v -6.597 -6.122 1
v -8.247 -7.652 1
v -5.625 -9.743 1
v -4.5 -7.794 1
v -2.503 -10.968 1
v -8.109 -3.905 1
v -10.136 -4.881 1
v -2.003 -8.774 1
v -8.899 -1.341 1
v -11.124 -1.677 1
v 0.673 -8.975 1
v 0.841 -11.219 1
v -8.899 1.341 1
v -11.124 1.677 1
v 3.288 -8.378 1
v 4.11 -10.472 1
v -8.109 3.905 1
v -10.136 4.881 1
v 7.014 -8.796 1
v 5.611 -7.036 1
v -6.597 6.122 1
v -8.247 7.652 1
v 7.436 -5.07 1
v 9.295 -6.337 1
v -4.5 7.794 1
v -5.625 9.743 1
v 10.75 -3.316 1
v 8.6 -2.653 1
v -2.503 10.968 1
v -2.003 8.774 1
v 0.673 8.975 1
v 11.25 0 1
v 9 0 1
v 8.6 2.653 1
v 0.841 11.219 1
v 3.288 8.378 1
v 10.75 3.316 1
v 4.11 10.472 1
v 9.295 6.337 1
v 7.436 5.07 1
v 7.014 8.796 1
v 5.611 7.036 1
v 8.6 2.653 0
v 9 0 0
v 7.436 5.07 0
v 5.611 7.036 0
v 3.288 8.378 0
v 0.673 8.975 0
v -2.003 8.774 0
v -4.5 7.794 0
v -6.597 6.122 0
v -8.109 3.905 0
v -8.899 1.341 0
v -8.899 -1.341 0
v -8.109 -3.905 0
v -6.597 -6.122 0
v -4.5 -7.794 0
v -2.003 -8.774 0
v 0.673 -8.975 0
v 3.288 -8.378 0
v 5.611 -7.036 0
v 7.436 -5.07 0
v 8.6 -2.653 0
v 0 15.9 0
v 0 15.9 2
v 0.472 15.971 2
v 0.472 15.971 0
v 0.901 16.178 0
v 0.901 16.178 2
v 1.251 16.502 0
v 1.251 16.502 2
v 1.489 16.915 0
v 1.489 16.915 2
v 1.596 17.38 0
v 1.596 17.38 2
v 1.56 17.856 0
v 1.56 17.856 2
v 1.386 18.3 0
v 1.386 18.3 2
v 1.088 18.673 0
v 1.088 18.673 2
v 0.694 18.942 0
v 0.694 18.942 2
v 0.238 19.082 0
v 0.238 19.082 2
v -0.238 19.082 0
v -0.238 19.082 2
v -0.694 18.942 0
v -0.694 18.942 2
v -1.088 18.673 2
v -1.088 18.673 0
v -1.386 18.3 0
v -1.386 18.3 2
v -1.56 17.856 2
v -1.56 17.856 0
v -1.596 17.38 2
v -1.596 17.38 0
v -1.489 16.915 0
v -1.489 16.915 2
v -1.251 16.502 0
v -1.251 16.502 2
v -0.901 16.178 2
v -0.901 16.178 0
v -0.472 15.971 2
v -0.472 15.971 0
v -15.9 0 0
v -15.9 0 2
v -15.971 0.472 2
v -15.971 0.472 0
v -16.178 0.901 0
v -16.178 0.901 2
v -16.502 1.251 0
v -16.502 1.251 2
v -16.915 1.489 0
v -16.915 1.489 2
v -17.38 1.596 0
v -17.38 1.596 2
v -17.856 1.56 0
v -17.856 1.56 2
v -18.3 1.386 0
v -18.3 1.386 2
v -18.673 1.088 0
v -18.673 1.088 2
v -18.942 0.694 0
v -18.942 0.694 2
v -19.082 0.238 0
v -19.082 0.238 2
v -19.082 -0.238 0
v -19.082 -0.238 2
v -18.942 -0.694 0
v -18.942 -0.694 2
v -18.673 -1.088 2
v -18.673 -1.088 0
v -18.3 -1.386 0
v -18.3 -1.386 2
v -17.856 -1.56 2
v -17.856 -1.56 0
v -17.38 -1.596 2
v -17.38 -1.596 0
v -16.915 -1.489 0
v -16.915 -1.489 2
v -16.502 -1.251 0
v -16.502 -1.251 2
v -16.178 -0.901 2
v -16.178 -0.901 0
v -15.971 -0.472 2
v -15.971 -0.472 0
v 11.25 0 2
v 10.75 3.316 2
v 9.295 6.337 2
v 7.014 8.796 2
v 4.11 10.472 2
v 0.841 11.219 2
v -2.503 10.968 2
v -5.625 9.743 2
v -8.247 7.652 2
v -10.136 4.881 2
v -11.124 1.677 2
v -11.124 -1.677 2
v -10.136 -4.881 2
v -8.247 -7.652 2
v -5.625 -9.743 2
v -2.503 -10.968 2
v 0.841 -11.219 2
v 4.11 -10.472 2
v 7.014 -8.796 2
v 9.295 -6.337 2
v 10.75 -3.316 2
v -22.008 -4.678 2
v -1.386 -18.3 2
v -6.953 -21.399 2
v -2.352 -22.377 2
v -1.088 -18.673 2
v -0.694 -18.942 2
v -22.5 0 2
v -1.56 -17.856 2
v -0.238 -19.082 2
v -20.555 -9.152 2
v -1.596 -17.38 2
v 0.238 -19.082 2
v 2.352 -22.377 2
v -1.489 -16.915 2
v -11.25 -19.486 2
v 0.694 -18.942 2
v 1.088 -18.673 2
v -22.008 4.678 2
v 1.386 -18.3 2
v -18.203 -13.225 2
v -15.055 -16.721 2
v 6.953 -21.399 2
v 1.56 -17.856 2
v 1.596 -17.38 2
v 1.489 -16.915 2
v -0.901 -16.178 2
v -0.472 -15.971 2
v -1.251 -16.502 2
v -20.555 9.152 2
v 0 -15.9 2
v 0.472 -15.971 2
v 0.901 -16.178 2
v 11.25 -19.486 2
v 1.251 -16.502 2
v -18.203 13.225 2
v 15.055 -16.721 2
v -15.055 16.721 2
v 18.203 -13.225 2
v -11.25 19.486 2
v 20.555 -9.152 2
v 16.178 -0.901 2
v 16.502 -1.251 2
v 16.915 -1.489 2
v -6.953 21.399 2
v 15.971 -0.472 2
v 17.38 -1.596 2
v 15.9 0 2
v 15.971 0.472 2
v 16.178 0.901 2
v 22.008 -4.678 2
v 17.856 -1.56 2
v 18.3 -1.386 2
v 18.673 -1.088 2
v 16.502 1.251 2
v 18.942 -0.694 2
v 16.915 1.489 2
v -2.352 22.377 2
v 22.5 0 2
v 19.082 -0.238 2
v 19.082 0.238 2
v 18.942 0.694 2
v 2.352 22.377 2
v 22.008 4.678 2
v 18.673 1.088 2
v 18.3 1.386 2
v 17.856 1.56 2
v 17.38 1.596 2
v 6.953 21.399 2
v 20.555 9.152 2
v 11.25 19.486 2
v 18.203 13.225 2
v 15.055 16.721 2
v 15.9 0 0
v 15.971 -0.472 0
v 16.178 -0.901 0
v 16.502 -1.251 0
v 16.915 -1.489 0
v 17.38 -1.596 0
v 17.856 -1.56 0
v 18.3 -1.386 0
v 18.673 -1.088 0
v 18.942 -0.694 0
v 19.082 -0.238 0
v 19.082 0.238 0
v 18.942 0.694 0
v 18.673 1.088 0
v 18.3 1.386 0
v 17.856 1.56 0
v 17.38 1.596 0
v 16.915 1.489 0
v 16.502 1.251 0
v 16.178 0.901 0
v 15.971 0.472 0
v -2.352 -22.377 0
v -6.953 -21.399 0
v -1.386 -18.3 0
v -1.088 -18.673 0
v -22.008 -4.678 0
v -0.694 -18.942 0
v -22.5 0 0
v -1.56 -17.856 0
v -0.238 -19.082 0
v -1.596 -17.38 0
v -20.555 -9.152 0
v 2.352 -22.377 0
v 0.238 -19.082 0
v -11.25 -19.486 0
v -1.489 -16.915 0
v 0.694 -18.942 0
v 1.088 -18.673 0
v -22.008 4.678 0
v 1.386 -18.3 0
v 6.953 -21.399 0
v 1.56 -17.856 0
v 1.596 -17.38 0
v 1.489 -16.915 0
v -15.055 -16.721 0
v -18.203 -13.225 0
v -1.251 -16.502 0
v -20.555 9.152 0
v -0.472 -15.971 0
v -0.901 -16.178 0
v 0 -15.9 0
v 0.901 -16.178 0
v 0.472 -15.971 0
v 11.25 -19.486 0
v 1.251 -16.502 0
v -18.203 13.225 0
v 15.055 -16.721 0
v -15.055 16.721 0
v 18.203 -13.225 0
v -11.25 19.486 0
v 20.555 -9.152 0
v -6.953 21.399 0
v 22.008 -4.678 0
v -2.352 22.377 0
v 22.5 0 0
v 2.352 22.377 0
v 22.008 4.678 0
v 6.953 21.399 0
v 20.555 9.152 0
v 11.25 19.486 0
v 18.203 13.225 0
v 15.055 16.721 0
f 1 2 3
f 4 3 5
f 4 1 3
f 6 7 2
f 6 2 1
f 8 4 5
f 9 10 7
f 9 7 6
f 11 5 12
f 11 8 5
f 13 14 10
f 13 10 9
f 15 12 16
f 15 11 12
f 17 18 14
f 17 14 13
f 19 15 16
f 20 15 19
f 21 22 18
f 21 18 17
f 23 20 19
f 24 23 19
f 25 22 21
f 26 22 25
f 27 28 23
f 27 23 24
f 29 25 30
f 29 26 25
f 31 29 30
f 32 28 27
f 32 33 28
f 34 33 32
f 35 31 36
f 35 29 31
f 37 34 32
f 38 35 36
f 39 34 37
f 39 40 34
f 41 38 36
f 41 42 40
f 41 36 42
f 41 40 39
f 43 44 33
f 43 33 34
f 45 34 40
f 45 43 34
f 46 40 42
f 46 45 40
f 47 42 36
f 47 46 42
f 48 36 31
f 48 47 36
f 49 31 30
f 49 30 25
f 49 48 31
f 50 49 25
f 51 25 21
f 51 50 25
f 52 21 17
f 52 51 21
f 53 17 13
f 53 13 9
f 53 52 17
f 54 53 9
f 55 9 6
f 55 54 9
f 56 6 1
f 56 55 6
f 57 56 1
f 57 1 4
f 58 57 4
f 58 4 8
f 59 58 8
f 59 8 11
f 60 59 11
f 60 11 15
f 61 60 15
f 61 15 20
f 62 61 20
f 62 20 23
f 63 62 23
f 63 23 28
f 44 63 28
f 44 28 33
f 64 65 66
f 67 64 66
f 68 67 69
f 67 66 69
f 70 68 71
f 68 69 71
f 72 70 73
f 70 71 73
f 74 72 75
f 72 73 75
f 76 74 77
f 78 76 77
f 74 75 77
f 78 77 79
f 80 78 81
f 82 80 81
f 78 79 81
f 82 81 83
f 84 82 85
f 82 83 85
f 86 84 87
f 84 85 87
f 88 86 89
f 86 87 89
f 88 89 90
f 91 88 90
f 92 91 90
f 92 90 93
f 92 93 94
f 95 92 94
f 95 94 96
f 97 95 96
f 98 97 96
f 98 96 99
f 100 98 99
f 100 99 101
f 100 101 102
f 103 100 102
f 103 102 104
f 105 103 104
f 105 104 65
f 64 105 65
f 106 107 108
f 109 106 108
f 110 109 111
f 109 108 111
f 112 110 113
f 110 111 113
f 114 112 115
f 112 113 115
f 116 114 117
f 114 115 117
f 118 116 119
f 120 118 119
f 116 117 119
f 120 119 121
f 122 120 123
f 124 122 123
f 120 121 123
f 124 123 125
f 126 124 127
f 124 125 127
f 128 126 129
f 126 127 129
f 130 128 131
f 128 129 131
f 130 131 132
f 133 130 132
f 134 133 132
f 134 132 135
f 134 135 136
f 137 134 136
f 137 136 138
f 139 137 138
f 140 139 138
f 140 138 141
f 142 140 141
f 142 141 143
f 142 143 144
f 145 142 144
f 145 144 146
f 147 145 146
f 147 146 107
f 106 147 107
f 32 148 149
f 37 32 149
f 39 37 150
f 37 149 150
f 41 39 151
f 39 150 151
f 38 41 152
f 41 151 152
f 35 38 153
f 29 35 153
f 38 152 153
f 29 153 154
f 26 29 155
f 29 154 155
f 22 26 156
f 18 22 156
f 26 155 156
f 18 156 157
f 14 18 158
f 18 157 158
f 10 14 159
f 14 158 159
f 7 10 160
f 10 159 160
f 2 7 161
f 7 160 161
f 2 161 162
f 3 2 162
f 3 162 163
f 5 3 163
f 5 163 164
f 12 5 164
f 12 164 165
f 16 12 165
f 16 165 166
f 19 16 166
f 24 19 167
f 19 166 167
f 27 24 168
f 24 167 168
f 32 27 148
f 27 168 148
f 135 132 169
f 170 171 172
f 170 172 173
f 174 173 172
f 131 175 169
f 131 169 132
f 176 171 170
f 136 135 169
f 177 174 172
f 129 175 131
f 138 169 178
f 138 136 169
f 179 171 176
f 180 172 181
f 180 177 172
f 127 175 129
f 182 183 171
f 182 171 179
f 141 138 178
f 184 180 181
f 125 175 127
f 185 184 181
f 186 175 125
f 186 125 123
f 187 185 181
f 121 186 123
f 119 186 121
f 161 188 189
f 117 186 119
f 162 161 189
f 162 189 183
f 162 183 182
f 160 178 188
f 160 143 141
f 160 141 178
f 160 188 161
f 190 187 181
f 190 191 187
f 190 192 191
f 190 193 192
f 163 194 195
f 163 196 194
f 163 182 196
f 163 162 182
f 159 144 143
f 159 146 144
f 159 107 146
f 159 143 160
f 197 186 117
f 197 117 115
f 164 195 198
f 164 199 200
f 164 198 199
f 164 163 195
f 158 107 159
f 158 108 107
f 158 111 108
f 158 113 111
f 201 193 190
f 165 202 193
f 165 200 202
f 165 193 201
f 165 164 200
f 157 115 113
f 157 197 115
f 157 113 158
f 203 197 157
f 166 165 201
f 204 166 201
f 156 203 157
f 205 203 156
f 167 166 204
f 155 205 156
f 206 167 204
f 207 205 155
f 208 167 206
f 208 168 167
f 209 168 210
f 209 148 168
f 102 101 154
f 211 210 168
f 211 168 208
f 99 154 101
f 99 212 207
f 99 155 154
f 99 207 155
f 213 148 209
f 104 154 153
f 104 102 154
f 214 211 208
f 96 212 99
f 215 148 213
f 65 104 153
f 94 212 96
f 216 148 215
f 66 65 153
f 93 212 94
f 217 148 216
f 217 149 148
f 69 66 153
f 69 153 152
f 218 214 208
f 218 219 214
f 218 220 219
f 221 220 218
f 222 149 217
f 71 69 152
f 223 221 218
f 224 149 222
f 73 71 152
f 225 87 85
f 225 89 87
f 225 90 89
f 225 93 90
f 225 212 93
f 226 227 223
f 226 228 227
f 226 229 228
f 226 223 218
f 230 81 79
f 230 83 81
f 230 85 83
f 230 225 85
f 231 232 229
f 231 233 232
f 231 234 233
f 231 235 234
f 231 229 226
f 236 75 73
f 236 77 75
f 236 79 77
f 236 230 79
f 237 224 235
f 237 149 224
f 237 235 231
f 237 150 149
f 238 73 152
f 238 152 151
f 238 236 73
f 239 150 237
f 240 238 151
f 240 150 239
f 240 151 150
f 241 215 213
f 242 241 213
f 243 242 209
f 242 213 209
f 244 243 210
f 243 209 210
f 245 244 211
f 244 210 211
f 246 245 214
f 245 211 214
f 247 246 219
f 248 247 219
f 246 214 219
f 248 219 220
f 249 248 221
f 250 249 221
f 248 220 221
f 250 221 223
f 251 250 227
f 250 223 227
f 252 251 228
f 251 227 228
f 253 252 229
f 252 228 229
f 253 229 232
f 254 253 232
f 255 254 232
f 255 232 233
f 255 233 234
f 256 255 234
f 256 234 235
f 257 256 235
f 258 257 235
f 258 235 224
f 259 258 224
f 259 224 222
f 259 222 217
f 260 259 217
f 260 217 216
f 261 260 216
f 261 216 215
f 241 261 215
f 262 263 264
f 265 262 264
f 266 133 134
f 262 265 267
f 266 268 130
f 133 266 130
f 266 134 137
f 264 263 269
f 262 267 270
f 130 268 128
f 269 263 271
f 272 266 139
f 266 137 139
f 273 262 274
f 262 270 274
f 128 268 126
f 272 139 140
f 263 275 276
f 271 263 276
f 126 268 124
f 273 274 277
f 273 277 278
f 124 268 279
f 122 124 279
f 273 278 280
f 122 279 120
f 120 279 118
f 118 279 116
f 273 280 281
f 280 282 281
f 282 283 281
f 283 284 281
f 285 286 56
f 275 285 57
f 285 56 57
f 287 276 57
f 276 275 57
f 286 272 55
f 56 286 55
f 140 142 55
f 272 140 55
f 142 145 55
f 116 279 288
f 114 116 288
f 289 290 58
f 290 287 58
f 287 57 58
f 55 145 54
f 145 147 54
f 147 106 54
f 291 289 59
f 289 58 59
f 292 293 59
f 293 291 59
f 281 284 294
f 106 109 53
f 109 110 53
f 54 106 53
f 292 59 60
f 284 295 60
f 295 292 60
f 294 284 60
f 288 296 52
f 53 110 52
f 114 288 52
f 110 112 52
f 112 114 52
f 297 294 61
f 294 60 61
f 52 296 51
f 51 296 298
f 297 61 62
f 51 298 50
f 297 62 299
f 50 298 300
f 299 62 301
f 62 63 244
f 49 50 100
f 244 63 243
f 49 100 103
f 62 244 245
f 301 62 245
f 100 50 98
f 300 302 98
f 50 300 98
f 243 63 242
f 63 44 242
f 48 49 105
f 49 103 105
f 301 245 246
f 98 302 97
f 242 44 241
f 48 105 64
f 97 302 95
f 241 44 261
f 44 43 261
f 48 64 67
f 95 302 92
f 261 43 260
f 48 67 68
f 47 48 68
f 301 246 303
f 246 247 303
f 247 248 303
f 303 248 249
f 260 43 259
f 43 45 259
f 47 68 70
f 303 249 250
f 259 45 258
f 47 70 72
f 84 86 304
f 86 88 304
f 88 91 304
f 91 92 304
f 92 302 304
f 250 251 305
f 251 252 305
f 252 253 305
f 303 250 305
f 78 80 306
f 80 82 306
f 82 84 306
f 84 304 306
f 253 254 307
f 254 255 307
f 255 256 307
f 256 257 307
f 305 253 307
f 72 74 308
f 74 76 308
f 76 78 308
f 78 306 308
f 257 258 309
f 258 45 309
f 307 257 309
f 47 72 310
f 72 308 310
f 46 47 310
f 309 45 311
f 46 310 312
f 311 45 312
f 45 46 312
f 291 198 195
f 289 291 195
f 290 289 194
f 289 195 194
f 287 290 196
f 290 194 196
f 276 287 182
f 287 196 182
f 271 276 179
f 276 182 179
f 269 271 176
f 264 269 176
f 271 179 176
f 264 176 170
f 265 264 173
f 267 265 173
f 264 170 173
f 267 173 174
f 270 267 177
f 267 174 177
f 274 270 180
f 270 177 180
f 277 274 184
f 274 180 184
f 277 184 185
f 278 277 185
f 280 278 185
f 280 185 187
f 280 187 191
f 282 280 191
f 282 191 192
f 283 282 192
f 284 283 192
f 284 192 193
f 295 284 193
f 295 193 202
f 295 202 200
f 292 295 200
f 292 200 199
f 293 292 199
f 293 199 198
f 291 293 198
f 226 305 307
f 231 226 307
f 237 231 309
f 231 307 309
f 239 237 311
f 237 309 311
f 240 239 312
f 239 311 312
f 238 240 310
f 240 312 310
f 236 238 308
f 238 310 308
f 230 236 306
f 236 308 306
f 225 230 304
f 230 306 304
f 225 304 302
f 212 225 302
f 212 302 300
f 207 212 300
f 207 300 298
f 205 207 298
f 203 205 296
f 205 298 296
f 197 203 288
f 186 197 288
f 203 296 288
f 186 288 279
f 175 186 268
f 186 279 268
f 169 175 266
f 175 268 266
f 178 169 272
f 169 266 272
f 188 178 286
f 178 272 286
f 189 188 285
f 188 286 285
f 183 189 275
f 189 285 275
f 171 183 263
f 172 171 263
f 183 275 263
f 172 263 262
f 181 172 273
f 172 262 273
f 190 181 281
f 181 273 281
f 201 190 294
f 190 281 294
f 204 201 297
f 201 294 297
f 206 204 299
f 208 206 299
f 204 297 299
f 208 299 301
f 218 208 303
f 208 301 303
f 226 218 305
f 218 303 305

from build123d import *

# Parameters (mm, degrees)
SKETCH_1_R               = 22.5
SKETCH_1_R_2             = 9
EXTRUDE_1_DEPTH          = 2
SKETCH_2_R               = 1.6
CUT_EXTRUDE_1_DEPTH      = 3
PATTERN_CIRCULAR_2_COUNT = 4
SKETCH_3_R               = 11.25
SKETCH_3_R_2             = 9
CUT_EXTRUDE_2_DEPTH      = 1


with BuildPart() as part:
    # ｽｹｯﾁ1 → ﾎﾞｽ - 押し出し1 (new body)
    with BuildSketch(Plane.XY):
        Circle(SKETCH_1_R)
        Circle(SKETCH_1_R_2, mode=Mode.SUBTRACT)
    extrude(amount=EXTRUDE_1_DEPTH)

    # ｽｹｯﾁ2 → ｶｯﾄ - 押し出し1 (cut, through all)
    with BuildSketch(Plane.XY.offset(2)):
        with Locations((-17.5, 0)):
            Circle(SKETCH_2_R)
    cut_extrude_1 = extrude(amount=-CUT_EXTRUDE_1_DEPTH, mode=Mode.SUBTRACT)

    # 円形ﾊﾟﾀｰﾝ2: ｶｯﾄ - 押し出し1 ×4 about axis
    pattern_circular_2_axis = Axis((0, 0, 0), (0, 0, 1))
    for i in range(1, PATTERN_CIRCULAR_2_COUNT):
        add(cut_extrude_1.rotate(pattern_circular_2_axis, i * 360 / PATTERN_CIRCULAR_2_COUNT), mode=Mode.SUBTRACT)

    # ｽｹｯﾁ3 → ｶｯﾄ - 押し出し2 (cut)
    with BuildSketch(Plane.XY.offset(2)):
        Circle(SKETCH_3_R)
        Circle(SKETCH_3_R_2, mode=Mode.SUBTRACT)
    extrude(amount=-CUT_EXTRUDE_2_DEPTH, mode=Mode.SUBTRACT)


solid = part.part
